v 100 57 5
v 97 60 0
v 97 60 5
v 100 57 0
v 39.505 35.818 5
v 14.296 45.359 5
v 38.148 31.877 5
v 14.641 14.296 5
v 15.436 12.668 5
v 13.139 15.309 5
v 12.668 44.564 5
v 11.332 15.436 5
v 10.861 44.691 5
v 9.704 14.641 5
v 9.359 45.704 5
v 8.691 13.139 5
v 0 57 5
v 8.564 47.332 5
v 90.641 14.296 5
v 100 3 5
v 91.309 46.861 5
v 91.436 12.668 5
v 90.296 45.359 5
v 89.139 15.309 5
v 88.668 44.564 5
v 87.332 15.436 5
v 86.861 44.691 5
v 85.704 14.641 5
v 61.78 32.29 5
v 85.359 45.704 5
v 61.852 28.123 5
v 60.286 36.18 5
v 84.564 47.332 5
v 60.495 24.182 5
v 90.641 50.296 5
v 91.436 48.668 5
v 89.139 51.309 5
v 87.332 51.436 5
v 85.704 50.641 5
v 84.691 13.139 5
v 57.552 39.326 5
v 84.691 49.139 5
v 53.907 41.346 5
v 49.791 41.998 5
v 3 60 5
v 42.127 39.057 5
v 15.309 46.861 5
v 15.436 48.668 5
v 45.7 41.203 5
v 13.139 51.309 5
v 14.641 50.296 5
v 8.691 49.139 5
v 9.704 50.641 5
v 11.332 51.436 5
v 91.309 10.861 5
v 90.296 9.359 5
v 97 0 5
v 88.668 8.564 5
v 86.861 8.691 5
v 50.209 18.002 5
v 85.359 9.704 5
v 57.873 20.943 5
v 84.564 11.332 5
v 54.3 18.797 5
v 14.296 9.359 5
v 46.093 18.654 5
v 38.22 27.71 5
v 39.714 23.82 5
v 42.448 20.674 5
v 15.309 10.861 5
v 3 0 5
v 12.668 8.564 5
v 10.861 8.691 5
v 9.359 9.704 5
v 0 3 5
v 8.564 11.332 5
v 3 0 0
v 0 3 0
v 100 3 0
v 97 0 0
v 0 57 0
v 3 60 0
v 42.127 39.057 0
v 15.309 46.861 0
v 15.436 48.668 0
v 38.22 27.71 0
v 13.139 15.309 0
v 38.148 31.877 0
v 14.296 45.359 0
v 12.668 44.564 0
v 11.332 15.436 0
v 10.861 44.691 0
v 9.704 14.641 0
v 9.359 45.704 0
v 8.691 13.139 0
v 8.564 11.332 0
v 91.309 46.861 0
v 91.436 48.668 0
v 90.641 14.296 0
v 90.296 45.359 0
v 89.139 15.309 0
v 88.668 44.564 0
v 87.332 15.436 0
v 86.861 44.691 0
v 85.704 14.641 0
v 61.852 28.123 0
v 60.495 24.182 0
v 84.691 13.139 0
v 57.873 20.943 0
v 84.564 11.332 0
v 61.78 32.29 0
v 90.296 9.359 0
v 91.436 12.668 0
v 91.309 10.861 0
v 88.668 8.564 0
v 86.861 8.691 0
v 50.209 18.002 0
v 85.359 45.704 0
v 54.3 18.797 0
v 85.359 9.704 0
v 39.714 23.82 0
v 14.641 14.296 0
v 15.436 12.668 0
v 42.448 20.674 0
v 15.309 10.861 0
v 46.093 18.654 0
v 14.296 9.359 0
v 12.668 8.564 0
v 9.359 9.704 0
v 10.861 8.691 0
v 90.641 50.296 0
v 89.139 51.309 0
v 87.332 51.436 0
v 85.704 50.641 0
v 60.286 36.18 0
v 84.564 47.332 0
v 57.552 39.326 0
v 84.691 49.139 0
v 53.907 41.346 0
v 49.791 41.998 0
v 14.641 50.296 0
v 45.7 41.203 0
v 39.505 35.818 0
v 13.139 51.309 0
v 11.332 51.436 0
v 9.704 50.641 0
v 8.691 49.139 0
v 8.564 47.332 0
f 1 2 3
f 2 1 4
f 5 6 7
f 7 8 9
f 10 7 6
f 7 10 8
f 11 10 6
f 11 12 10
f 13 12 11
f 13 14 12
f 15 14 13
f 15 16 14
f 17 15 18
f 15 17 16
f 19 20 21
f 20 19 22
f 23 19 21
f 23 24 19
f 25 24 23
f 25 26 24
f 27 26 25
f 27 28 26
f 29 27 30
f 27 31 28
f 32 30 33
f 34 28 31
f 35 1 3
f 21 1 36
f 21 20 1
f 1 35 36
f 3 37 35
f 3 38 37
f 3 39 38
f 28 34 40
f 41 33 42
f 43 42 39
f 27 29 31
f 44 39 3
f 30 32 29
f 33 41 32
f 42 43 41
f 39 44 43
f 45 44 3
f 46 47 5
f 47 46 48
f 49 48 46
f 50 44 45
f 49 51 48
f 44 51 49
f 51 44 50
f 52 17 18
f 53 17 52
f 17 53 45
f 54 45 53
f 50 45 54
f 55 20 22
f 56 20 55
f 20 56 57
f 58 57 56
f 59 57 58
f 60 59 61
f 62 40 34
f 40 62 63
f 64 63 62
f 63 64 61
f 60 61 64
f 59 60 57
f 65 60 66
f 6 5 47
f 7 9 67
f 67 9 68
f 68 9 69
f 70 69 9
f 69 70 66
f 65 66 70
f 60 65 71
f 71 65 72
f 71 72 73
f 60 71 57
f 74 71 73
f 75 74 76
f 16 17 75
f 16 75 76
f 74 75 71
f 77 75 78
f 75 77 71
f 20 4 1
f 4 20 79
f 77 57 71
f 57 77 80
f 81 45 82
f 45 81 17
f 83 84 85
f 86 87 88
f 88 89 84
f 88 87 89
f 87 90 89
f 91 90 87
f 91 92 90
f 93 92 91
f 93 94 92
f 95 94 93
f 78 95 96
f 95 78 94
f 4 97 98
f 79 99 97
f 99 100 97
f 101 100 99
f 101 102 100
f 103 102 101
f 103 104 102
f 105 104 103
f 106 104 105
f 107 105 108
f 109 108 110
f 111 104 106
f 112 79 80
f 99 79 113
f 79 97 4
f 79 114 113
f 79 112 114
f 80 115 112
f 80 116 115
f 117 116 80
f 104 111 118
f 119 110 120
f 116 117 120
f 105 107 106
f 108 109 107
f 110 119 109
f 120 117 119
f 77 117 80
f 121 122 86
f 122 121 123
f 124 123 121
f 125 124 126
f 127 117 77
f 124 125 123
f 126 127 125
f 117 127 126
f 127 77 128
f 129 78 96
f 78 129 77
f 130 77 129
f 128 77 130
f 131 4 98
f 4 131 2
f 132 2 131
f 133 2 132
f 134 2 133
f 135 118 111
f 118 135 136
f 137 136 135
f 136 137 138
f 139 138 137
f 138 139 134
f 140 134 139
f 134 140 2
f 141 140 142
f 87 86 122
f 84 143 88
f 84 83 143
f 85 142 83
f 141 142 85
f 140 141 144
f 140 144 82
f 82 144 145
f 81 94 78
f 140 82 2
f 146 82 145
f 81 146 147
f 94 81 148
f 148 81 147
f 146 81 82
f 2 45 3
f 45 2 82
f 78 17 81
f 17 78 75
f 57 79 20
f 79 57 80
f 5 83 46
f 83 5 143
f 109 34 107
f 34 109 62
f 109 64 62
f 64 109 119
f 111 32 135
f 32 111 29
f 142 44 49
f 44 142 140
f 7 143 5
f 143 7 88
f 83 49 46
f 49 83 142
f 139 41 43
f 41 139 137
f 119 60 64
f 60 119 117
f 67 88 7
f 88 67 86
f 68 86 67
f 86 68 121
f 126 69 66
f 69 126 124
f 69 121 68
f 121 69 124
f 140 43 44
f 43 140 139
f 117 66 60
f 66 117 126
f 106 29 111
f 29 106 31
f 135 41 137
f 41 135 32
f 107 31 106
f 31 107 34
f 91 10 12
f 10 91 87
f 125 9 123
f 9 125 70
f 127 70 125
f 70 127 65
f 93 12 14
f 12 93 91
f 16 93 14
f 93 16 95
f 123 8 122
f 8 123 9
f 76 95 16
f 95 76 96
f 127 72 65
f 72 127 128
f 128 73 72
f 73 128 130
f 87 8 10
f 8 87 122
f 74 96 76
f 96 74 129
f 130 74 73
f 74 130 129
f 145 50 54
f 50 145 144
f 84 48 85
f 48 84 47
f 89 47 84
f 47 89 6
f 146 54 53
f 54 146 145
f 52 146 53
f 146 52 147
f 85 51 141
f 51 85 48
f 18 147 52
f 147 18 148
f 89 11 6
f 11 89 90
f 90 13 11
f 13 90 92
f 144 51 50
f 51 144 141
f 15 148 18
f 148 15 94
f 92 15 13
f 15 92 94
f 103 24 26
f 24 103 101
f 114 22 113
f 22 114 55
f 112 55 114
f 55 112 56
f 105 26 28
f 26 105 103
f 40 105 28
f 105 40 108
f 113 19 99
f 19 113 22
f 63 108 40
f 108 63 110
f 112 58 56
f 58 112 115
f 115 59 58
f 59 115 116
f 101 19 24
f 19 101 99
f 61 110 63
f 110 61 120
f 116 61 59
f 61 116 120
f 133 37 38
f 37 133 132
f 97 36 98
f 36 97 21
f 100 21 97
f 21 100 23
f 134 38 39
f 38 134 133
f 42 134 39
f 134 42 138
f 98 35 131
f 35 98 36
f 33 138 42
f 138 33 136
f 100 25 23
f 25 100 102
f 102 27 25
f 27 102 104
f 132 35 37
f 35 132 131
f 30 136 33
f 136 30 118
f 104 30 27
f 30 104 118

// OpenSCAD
$fn = 32;

// ----------------------------------------------------------------------
// Spacer plate: rect 100 x 60
// ----------------------------------------------------------------------

// --- parameters (mm) ---
bore_r = 12;              // centre bore radius
bolt_r = 3.5;             // bolt hole radius
plate_t = 5;              // plate thickness, Z (extrusion height)
plate_l = 100;            // plate length, X
plate_w = 60;             // plate width, Y
inset = 12;               // corner hole inset

profile = [[3, 0], [97, 0], [100, 3], [100, 57], [97, 60], [3, 60], [0, 57], [0, 3]];  // primary outline, 8 points, counter clockwise
void_1 = [[61.78, 32.29], [60.286, 36.18], [57.552, 39.326], [53.907, 41.346], [49.791, 41.998], [45.7, 41.203], [42.127, 39.057], [39.505, 35.818], [38.148, 31.877], [38.22, 27.71], [39.714, 23.82], [42.448, 20.674], [46.093, 18.654], [50.209, 18.002], [54.3, 18.797], [57.873, 20.943], [60.495, 24.182], [61.852, 28.123]];  // centre bore, 18 points
void_2 = [[15.436, 12.668], [14.641, 14.296], [13.139, 15.309], [11.332, 15.436], [9.704, 14.641], [8.691, 13.139], [8.564, 11.332], [9.359, 9.704], [10.861, 8.691], [12.668, 8.564], [14.296, 9.359], [15.309, 10.861]];  // corner hole, 12 points
void_3 = [[15.436, 48.668], [14.641, 50.296], [13.139, 51.309], [11.332, 51.436], [9.704, 50.641], [8.691, 49.139], [8.564, 47.332], [9.359, 45.704], [10.861, 44.691], [12.668, 44.564], [14.296, 45.359], [15.309, 46.861]];  // corner hole, 12 points
void_4 = [[91.436, 12.668], [90.641, 14.296], [89.139, 15.309], [87.332, 15.436], [85.704, 14.641], [84.691, 13.139], [84.564, 11.332], [85.359, 9.704], [86.861, 8.691], [88.668, 8.564], [90.296, 9.359], [91.309, 10.861]];  // corner hole, 12 points
void_5 = [[91.436, 48.668], [90.641, 50.296], [89.139, 51.309], [87.332, 51.436], [85.704, 50.641], [84.691, 49.139], [84.564, 47.332], [85.359, 45.704], [86.861, 44.691], [88.668, 44.564], [90.296, 45.359], [91.309, 46.861]];  // corner hole, 12 points

// --- the one profile operation ---
difference() {
  linear_extrude(height = plate_t) polygon(points = profile);
  translate([0, 0, -1])
    linear_extrude(height = plate_t + 2) polygon(points = void_1);
  translate([0, 0, -1])
    linear_extrude(height = plate_t + 2) polygon(points = void_2);
  translate([0, 0, -1])
    linear_extrude(height = plate_t + 2) polygon(points = void_3);
  translate([0, 0, -1])
    linear_extrude(height = plate_t + 2) polygon(points = void_4);
  translate([0, 0, -1])
    linear_extrude(height = plate_t + 2) polygon(points = void_5);
}
